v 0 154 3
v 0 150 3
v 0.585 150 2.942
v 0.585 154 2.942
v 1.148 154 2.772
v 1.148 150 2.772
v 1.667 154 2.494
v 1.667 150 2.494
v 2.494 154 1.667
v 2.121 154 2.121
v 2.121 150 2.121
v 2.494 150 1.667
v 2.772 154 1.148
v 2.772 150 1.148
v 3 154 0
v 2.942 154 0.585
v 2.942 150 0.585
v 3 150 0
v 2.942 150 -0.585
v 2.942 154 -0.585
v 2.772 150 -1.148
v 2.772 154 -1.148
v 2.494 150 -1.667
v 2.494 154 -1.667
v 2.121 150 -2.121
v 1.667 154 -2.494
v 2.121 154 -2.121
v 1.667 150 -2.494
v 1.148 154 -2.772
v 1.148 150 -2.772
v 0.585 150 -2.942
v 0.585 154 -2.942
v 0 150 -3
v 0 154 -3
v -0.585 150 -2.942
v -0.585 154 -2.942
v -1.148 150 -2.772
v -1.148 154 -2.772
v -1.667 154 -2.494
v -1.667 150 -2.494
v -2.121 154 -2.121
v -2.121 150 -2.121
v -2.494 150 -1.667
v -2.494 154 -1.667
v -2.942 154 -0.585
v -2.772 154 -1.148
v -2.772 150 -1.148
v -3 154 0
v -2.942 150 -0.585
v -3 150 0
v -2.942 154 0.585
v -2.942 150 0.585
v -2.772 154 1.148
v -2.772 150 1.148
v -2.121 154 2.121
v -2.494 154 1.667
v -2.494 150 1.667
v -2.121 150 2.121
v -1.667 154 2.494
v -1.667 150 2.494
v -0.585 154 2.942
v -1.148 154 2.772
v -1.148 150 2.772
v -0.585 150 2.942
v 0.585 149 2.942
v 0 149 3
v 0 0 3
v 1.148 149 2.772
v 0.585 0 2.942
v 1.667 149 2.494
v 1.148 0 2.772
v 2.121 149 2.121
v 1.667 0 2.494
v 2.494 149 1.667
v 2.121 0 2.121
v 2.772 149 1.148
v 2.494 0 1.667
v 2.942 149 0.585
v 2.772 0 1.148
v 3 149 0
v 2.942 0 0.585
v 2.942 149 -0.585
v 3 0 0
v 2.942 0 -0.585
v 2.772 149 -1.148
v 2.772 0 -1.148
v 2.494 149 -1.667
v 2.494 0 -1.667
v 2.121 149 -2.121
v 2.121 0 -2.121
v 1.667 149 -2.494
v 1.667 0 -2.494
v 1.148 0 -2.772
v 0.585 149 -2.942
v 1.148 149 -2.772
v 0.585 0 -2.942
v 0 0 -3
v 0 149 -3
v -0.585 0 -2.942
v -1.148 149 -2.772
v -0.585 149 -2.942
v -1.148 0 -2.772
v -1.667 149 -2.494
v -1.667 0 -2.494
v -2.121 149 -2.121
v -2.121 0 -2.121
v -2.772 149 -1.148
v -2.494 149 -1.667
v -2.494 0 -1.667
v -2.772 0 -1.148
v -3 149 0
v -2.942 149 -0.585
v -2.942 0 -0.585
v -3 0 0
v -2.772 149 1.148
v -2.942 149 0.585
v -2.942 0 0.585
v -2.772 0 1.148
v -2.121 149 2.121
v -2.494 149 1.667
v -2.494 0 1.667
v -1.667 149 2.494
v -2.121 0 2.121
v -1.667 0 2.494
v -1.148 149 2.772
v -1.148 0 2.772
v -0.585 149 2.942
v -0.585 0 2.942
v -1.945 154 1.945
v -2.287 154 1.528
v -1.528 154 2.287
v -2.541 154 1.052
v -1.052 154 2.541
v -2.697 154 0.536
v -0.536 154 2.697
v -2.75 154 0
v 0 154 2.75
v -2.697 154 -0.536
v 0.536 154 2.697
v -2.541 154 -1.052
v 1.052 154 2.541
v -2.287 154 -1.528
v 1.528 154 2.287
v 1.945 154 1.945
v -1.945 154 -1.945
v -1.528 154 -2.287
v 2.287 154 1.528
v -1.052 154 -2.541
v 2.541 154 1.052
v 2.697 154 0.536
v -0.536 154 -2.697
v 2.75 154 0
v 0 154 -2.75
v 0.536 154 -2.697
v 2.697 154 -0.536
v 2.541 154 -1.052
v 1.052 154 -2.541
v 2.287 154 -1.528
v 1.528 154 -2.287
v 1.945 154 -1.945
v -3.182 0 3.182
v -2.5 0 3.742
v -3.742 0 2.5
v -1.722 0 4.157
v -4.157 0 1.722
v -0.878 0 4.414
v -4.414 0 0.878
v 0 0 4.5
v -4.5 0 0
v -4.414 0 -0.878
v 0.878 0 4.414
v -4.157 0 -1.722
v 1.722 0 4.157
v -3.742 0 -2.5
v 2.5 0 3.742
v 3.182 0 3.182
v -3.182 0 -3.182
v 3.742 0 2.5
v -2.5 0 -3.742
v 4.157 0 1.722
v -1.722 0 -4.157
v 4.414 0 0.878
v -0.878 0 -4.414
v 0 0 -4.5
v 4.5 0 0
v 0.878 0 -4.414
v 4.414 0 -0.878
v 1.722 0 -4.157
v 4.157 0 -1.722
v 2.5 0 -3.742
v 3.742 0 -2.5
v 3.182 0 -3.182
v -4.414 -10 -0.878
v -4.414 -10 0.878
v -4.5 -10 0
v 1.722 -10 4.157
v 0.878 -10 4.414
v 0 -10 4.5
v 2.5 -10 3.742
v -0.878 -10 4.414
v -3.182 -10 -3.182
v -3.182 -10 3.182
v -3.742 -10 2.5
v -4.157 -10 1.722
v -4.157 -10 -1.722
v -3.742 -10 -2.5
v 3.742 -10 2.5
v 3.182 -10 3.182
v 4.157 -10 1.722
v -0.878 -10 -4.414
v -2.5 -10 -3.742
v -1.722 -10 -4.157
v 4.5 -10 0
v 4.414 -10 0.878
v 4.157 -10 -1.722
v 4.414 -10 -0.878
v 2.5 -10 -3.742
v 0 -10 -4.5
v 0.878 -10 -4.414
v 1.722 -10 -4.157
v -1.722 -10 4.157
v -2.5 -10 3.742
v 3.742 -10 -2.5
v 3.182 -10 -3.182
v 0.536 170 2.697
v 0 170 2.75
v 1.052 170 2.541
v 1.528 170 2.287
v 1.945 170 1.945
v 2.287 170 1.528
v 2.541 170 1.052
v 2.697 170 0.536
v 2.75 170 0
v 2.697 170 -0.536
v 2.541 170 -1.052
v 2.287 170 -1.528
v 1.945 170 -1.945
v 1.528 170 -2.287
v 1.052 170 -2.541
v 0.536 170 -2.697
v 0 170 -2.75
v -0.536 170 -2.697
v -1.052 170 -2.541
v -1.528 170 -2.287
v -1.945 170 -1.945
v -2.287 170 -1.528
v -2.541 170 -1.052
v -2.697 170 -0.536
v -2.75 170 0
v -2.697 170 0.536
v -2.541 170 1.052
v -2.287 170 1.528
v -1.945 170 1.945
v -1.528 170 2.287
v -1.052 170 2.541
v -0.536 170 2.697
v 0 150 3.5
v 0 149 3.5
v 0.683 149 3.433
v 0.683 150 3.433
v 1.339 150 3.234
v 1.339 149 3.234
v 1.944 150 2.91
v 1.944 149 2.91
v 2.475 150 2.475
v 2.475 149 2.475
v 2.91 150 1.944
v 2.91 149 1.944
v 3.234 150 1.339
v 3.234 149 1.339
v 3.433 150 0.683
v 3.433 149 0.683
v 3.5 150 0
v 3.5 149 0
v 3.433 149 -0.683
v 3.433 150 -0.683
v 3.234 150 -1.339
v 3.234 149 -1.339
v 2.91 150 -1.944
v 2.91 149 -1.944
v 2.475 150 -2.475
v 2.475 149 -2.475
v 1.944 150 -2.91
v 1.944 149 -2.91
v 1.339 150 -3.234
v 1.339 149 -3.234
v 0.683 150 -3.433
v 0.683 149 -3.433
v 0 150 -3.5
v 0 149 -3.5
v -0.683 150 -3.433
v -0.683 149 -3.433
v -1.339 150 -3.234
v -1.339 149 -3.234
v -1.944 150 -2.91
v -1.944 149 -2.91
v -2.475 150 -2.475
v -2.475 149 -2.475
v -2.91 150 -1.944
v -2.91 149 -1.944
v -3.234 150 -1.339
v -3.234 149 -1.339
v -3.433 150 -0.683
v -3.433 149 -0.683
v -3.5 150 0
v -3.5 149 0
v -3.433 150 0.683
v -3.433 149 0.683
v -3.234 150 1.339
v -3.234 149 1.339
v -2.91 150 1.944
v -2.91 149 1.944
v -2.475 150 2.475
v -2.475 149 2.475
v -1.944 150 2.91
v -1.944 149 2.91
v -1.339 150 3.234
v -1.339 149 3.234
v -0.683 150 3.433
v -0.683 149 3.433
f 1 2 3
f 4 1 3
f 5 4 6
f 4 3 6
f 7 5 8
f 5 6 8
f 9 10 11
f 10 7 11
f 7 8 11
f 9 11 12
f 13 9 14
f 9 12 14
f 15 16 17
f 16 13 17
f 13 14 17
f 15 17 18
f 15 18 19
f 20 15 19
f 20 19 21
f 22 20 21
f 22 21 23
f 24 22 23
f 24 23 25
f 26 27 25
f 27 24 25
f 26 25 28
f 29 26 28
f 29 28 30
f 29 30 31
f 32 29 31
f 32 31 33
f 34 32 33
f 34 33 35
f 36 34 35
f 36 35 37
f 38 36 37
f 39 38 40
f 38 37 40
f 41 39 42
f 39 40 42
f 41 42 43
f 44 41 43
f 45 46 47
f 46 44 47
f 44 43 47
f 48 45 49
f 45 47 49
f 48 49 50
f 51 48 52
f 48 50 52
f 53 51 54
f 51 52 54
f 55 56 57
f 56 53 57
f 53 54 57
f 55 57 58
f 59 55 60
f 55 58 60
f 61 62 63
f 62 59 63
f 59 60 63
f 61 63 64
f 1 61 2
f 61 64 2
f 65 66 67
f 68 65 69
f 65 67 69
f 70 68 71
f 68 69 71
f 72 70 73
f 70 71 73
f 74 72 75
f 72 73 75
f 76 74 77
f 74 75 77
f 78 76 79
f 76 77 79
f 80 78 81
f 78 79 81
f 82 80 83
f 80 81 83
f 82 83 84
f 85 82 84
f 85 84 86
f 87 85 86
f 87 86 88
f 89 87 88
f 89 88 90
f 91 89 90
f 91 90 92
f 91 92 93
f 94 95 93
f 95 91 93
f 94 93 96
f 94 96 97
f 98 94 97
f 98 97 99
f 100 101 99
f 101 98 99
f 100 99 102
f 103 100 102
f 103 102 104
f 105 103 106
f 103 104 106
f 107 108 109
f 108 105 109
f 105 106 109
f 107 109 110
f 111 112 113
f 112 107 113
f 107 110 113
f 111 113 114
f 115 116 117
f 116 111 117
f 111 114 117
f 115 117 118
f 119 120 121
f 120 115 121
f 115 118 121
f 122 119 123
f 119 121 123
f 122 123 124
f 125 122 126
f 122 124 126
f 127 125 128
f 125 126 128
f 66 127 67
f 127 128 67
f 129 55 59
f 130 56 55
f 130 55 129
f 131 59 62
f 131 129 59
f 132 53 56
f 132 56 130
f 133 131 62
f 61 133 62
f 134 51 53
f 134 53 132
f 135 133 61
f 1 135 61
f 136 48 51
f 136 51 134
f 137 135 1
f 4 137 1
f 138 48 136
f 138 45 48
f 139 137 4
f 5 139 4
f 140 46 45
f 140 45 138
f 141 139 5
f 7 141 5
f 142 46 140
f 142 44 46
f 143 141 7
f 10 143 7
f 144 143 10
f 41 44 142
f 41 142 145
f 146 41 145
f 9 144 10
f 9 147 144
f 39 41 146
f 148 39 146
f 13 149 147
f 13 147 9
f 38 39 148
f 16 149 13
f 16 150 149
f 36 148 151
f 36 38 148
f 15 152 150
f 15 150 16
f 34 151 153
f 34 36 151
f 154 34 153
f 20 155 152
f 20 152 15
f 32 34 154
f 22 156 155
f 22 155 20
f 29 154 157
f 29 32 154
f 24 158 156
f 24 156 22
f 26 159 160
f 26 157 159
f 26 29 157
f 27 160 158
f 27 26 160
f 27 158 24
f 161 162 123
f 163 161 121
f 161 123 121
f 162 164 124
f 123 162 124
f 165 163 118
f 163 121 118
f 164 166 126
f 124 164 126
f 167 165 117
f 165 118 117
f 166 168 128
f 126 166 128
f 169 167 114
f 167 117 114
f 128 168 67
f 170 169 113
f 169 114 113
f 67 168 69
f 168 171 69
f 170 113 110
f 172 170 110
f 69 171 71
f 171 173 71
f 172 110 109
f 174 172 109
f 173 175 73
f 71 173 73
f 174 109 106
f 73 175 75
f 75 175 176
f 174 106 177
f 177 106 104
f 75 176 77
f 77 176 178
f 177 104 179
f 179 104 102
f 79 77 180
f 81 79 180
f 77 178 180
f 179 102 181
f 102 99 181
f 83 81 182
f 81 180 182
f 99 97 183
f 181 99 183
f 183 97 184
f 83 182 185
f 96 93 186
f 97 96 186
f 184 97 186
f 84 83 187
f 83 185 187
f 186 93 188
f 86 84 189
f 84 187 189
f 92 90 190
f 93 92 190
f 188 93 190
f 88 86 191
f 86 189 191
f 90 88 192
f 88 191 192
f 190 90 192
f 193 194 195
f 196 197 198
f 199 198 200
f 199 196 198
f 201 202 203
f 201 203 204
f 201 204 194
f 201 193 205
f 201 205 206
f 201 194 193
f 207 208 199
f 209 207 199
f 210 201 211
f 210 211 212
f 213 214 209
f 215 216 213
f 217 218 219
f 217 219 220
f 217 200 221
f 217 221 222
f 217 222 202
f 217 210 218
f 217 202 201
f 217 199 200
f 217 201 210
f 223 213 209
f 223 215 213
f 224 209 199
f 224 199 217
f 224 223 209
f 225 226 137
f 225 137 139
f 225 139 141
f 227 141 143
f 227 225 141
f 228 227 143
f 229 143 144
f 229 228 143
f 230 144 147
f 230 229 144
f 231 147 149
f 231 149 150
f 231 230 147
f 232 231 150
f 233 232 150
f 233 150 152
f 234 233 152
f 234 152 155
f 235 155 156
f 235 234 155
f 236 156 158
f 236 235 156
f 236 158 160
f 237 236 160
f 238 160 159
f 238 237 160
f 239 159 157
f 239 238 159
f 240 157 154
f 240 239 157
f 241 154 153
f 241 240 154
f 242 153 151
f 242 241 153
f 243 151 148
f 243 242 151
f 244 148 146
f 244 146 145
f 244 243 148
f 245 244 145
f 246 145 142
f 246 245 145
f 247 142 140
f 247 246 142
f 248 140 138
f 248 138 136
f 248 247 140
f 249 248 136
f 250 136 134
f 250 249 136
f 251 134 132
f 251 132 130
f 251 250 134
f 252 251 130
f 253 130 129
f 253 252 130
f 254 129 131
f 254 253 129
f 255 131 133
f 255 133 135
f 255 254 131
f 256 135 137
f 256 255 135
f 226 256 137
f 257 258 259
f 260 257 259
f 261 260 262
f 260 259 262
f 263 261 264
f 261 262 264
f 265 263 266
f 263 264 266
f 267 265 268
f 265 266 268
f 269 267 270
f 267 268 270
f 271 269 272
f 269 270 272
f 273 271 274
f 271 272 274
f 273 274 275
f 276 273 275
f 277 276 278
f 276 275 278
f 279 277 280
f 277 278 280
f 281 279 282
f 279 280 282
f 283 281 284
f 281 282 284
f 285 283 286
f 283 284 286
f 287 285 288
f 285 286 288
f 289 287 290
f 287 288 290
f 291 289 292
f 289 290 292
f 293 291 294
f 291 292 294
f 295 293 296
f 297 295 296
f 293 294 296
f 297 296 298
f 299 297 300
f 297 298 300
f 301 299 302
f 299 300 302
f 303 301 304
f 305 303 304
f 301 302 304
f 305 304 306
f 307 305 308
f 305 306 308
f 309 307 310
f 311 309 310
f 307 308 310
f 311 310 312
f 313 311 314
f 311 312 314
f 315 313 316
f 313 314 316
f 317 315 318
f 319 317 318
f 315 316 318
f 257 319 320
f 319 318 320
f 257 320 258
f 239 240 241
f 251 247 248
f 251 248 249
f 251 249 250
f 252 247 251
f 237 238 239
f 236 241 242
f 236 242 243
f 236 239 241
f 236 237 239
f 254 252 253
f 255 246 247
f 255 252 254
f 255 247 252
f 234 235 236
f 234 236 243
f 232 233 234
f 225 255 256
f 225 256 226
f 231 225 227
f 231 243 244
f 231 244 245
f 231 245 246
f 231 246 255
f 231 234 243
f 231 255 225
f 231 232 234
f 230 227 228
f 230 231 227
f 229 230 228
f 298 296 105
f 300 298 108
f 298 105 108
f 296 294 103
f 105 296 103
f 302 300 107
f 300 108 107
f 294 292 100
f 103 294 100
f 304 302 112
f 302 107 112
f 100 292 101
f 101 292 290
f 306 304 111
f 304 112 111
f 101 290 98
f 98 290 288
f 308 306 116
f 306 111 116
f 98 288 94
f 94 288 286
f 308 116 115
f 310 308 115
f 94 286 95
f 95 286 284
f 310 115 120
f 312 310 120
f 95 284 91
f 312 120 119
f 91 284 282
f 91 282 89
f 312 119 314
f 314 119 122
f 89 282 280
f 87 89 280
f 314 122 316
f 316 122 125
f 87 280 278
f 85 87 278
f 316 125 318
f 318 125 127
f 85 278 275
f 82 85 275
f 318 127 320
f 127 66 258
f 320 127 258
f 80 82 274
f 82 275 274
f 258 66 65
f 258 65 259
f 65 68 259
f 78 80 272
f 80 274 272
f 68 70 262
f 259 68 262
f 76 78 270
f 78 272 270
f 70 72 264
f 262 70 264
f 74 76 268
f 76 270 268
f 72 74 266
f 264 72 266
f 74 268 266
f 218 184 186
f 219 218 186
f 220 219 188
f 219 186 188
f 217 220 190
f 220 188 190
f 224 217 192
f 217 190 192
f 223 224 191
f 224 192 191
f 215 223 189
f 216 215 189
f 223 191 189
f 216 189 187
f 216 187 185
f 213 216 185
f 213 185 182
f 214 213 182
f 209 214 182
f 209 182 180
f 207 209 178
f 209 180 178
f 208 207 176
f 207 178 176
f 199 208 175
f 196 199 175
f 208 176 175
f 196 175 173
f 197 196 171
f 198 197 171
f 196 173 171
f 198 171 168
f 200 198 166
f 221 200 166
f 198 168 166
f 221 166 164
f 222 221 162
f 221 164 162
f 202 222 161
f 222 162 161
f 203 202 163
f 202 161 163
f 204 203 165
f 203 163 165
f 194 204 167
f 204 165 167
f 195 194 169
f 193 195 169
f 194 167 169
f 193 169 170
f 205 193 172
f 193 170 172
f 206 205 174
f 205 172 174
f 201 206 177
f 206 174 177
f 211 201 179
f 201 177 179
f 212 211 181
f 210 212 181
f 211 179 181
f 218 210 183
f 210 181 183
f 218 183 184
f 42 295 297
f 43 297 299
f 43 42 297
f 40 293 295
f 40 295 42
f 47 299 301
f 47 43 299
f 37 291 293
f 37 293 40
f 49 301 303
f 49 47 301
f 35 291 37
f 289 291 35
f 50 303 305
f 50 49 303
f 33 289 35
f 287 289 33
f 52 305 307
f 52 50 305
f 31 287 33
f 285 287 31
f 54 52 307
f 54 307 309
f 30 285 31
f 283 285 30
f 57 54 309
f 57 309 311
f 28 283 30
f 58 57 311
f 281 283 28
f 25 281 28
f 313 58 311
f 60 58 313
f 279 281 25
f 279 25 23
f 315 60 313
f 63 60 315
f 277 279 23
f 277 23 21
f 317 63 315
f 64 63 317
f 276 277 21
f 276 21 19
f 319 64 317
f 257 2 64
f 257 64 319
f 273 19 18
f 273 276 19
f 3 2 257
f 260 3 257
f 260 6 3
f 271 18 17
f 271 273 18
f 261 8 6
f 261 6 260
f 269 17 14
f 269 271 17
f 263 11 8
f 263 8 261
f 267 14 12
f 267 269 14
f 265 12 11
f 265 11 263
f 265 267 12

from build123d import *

# Parameters (mm, degrees)
SKETCH2_R           = 3
BOSS_EXTRUDE1_DEPTH = 170
SKETCH3_R           = 4.5
BOSS_EXTRUDE2_DEPTH = 10
SKETCH4_OUTSIDE_W   = 47.09
SKETCH4_OUTSIDE_H   = 47.09
SKETCH4_OUTSIDE_R   = 2.75
CUT_EXTRUDE1_DEPTH  = 16
BOSS_EXTRUDE3_START = -21
SKETCH5_R           = 3.5
BOSS_EXTRUDE3_DEPTH = 1


with BuildPart() as part:
    # Sketch2 → Boss-Extrude1 (new body)
    with BuildSketch(Plane(origin=(0, 0, 0), x_dir=(1, 0, 0), z_dir=(0, 1, 0))):
        with Locations(Location((0, 0, 0), (0, 0, 270))):  # turned: the seam where the file's is
            Circle(SKETCH2_R)
    extrude(amount=BOSS_EXTRUDE1_DEPTH)

    # Sketch3 → Boss-Extrude2 (add)
    with BuildSketch(Plane.XZ):
        with Locations(Location((0, 0, 0), (0, 0, 270))):  # turned: the seam where the file's is
            Circle(SKETCH3_R)
    extrude(amount=BOSS_EXTRUDE2_DEPTH)

    # Sketch4 outside → Cut-Extrude1 (cut)
    with BuildSketch(Plane(origin=(0, 170, 0), x_dir=(1, 0, 0), z_dir=(0, 1, 0))):
        Rectangle(SKETCH4_OUTSIDE_W, SKETCH4_OUTSIDE_H)
        with Locations(Location((0, 0, 0), (0, 0, 270))):  # turned: the seam where the file's is
            Circle(SKETCH4_OUTSIDE_R, mode=Mode.SUBTRACT)
    extrude(amount=-CUT_EXTRUDE1_DEPTH, mode=Mode.SUBTRACT)

    # Sketch5 → Boss-Extrude3 (add)
    with BuildSketch(Plane(origin=(0, 170, 0), x_dir=(1, 0, 0), z_dir=(0, 1, 0)).offset(BOSS_EXTRUDE3_START)):
        with Locations(Location((0, 0, 0), (0, 0, 270))):  # turned: the seam where the file's is
            Circle(SKETCH5_R)
    extrude(amount=BOSS_EXTRUDE3_DEPTH)


solid = part.part
